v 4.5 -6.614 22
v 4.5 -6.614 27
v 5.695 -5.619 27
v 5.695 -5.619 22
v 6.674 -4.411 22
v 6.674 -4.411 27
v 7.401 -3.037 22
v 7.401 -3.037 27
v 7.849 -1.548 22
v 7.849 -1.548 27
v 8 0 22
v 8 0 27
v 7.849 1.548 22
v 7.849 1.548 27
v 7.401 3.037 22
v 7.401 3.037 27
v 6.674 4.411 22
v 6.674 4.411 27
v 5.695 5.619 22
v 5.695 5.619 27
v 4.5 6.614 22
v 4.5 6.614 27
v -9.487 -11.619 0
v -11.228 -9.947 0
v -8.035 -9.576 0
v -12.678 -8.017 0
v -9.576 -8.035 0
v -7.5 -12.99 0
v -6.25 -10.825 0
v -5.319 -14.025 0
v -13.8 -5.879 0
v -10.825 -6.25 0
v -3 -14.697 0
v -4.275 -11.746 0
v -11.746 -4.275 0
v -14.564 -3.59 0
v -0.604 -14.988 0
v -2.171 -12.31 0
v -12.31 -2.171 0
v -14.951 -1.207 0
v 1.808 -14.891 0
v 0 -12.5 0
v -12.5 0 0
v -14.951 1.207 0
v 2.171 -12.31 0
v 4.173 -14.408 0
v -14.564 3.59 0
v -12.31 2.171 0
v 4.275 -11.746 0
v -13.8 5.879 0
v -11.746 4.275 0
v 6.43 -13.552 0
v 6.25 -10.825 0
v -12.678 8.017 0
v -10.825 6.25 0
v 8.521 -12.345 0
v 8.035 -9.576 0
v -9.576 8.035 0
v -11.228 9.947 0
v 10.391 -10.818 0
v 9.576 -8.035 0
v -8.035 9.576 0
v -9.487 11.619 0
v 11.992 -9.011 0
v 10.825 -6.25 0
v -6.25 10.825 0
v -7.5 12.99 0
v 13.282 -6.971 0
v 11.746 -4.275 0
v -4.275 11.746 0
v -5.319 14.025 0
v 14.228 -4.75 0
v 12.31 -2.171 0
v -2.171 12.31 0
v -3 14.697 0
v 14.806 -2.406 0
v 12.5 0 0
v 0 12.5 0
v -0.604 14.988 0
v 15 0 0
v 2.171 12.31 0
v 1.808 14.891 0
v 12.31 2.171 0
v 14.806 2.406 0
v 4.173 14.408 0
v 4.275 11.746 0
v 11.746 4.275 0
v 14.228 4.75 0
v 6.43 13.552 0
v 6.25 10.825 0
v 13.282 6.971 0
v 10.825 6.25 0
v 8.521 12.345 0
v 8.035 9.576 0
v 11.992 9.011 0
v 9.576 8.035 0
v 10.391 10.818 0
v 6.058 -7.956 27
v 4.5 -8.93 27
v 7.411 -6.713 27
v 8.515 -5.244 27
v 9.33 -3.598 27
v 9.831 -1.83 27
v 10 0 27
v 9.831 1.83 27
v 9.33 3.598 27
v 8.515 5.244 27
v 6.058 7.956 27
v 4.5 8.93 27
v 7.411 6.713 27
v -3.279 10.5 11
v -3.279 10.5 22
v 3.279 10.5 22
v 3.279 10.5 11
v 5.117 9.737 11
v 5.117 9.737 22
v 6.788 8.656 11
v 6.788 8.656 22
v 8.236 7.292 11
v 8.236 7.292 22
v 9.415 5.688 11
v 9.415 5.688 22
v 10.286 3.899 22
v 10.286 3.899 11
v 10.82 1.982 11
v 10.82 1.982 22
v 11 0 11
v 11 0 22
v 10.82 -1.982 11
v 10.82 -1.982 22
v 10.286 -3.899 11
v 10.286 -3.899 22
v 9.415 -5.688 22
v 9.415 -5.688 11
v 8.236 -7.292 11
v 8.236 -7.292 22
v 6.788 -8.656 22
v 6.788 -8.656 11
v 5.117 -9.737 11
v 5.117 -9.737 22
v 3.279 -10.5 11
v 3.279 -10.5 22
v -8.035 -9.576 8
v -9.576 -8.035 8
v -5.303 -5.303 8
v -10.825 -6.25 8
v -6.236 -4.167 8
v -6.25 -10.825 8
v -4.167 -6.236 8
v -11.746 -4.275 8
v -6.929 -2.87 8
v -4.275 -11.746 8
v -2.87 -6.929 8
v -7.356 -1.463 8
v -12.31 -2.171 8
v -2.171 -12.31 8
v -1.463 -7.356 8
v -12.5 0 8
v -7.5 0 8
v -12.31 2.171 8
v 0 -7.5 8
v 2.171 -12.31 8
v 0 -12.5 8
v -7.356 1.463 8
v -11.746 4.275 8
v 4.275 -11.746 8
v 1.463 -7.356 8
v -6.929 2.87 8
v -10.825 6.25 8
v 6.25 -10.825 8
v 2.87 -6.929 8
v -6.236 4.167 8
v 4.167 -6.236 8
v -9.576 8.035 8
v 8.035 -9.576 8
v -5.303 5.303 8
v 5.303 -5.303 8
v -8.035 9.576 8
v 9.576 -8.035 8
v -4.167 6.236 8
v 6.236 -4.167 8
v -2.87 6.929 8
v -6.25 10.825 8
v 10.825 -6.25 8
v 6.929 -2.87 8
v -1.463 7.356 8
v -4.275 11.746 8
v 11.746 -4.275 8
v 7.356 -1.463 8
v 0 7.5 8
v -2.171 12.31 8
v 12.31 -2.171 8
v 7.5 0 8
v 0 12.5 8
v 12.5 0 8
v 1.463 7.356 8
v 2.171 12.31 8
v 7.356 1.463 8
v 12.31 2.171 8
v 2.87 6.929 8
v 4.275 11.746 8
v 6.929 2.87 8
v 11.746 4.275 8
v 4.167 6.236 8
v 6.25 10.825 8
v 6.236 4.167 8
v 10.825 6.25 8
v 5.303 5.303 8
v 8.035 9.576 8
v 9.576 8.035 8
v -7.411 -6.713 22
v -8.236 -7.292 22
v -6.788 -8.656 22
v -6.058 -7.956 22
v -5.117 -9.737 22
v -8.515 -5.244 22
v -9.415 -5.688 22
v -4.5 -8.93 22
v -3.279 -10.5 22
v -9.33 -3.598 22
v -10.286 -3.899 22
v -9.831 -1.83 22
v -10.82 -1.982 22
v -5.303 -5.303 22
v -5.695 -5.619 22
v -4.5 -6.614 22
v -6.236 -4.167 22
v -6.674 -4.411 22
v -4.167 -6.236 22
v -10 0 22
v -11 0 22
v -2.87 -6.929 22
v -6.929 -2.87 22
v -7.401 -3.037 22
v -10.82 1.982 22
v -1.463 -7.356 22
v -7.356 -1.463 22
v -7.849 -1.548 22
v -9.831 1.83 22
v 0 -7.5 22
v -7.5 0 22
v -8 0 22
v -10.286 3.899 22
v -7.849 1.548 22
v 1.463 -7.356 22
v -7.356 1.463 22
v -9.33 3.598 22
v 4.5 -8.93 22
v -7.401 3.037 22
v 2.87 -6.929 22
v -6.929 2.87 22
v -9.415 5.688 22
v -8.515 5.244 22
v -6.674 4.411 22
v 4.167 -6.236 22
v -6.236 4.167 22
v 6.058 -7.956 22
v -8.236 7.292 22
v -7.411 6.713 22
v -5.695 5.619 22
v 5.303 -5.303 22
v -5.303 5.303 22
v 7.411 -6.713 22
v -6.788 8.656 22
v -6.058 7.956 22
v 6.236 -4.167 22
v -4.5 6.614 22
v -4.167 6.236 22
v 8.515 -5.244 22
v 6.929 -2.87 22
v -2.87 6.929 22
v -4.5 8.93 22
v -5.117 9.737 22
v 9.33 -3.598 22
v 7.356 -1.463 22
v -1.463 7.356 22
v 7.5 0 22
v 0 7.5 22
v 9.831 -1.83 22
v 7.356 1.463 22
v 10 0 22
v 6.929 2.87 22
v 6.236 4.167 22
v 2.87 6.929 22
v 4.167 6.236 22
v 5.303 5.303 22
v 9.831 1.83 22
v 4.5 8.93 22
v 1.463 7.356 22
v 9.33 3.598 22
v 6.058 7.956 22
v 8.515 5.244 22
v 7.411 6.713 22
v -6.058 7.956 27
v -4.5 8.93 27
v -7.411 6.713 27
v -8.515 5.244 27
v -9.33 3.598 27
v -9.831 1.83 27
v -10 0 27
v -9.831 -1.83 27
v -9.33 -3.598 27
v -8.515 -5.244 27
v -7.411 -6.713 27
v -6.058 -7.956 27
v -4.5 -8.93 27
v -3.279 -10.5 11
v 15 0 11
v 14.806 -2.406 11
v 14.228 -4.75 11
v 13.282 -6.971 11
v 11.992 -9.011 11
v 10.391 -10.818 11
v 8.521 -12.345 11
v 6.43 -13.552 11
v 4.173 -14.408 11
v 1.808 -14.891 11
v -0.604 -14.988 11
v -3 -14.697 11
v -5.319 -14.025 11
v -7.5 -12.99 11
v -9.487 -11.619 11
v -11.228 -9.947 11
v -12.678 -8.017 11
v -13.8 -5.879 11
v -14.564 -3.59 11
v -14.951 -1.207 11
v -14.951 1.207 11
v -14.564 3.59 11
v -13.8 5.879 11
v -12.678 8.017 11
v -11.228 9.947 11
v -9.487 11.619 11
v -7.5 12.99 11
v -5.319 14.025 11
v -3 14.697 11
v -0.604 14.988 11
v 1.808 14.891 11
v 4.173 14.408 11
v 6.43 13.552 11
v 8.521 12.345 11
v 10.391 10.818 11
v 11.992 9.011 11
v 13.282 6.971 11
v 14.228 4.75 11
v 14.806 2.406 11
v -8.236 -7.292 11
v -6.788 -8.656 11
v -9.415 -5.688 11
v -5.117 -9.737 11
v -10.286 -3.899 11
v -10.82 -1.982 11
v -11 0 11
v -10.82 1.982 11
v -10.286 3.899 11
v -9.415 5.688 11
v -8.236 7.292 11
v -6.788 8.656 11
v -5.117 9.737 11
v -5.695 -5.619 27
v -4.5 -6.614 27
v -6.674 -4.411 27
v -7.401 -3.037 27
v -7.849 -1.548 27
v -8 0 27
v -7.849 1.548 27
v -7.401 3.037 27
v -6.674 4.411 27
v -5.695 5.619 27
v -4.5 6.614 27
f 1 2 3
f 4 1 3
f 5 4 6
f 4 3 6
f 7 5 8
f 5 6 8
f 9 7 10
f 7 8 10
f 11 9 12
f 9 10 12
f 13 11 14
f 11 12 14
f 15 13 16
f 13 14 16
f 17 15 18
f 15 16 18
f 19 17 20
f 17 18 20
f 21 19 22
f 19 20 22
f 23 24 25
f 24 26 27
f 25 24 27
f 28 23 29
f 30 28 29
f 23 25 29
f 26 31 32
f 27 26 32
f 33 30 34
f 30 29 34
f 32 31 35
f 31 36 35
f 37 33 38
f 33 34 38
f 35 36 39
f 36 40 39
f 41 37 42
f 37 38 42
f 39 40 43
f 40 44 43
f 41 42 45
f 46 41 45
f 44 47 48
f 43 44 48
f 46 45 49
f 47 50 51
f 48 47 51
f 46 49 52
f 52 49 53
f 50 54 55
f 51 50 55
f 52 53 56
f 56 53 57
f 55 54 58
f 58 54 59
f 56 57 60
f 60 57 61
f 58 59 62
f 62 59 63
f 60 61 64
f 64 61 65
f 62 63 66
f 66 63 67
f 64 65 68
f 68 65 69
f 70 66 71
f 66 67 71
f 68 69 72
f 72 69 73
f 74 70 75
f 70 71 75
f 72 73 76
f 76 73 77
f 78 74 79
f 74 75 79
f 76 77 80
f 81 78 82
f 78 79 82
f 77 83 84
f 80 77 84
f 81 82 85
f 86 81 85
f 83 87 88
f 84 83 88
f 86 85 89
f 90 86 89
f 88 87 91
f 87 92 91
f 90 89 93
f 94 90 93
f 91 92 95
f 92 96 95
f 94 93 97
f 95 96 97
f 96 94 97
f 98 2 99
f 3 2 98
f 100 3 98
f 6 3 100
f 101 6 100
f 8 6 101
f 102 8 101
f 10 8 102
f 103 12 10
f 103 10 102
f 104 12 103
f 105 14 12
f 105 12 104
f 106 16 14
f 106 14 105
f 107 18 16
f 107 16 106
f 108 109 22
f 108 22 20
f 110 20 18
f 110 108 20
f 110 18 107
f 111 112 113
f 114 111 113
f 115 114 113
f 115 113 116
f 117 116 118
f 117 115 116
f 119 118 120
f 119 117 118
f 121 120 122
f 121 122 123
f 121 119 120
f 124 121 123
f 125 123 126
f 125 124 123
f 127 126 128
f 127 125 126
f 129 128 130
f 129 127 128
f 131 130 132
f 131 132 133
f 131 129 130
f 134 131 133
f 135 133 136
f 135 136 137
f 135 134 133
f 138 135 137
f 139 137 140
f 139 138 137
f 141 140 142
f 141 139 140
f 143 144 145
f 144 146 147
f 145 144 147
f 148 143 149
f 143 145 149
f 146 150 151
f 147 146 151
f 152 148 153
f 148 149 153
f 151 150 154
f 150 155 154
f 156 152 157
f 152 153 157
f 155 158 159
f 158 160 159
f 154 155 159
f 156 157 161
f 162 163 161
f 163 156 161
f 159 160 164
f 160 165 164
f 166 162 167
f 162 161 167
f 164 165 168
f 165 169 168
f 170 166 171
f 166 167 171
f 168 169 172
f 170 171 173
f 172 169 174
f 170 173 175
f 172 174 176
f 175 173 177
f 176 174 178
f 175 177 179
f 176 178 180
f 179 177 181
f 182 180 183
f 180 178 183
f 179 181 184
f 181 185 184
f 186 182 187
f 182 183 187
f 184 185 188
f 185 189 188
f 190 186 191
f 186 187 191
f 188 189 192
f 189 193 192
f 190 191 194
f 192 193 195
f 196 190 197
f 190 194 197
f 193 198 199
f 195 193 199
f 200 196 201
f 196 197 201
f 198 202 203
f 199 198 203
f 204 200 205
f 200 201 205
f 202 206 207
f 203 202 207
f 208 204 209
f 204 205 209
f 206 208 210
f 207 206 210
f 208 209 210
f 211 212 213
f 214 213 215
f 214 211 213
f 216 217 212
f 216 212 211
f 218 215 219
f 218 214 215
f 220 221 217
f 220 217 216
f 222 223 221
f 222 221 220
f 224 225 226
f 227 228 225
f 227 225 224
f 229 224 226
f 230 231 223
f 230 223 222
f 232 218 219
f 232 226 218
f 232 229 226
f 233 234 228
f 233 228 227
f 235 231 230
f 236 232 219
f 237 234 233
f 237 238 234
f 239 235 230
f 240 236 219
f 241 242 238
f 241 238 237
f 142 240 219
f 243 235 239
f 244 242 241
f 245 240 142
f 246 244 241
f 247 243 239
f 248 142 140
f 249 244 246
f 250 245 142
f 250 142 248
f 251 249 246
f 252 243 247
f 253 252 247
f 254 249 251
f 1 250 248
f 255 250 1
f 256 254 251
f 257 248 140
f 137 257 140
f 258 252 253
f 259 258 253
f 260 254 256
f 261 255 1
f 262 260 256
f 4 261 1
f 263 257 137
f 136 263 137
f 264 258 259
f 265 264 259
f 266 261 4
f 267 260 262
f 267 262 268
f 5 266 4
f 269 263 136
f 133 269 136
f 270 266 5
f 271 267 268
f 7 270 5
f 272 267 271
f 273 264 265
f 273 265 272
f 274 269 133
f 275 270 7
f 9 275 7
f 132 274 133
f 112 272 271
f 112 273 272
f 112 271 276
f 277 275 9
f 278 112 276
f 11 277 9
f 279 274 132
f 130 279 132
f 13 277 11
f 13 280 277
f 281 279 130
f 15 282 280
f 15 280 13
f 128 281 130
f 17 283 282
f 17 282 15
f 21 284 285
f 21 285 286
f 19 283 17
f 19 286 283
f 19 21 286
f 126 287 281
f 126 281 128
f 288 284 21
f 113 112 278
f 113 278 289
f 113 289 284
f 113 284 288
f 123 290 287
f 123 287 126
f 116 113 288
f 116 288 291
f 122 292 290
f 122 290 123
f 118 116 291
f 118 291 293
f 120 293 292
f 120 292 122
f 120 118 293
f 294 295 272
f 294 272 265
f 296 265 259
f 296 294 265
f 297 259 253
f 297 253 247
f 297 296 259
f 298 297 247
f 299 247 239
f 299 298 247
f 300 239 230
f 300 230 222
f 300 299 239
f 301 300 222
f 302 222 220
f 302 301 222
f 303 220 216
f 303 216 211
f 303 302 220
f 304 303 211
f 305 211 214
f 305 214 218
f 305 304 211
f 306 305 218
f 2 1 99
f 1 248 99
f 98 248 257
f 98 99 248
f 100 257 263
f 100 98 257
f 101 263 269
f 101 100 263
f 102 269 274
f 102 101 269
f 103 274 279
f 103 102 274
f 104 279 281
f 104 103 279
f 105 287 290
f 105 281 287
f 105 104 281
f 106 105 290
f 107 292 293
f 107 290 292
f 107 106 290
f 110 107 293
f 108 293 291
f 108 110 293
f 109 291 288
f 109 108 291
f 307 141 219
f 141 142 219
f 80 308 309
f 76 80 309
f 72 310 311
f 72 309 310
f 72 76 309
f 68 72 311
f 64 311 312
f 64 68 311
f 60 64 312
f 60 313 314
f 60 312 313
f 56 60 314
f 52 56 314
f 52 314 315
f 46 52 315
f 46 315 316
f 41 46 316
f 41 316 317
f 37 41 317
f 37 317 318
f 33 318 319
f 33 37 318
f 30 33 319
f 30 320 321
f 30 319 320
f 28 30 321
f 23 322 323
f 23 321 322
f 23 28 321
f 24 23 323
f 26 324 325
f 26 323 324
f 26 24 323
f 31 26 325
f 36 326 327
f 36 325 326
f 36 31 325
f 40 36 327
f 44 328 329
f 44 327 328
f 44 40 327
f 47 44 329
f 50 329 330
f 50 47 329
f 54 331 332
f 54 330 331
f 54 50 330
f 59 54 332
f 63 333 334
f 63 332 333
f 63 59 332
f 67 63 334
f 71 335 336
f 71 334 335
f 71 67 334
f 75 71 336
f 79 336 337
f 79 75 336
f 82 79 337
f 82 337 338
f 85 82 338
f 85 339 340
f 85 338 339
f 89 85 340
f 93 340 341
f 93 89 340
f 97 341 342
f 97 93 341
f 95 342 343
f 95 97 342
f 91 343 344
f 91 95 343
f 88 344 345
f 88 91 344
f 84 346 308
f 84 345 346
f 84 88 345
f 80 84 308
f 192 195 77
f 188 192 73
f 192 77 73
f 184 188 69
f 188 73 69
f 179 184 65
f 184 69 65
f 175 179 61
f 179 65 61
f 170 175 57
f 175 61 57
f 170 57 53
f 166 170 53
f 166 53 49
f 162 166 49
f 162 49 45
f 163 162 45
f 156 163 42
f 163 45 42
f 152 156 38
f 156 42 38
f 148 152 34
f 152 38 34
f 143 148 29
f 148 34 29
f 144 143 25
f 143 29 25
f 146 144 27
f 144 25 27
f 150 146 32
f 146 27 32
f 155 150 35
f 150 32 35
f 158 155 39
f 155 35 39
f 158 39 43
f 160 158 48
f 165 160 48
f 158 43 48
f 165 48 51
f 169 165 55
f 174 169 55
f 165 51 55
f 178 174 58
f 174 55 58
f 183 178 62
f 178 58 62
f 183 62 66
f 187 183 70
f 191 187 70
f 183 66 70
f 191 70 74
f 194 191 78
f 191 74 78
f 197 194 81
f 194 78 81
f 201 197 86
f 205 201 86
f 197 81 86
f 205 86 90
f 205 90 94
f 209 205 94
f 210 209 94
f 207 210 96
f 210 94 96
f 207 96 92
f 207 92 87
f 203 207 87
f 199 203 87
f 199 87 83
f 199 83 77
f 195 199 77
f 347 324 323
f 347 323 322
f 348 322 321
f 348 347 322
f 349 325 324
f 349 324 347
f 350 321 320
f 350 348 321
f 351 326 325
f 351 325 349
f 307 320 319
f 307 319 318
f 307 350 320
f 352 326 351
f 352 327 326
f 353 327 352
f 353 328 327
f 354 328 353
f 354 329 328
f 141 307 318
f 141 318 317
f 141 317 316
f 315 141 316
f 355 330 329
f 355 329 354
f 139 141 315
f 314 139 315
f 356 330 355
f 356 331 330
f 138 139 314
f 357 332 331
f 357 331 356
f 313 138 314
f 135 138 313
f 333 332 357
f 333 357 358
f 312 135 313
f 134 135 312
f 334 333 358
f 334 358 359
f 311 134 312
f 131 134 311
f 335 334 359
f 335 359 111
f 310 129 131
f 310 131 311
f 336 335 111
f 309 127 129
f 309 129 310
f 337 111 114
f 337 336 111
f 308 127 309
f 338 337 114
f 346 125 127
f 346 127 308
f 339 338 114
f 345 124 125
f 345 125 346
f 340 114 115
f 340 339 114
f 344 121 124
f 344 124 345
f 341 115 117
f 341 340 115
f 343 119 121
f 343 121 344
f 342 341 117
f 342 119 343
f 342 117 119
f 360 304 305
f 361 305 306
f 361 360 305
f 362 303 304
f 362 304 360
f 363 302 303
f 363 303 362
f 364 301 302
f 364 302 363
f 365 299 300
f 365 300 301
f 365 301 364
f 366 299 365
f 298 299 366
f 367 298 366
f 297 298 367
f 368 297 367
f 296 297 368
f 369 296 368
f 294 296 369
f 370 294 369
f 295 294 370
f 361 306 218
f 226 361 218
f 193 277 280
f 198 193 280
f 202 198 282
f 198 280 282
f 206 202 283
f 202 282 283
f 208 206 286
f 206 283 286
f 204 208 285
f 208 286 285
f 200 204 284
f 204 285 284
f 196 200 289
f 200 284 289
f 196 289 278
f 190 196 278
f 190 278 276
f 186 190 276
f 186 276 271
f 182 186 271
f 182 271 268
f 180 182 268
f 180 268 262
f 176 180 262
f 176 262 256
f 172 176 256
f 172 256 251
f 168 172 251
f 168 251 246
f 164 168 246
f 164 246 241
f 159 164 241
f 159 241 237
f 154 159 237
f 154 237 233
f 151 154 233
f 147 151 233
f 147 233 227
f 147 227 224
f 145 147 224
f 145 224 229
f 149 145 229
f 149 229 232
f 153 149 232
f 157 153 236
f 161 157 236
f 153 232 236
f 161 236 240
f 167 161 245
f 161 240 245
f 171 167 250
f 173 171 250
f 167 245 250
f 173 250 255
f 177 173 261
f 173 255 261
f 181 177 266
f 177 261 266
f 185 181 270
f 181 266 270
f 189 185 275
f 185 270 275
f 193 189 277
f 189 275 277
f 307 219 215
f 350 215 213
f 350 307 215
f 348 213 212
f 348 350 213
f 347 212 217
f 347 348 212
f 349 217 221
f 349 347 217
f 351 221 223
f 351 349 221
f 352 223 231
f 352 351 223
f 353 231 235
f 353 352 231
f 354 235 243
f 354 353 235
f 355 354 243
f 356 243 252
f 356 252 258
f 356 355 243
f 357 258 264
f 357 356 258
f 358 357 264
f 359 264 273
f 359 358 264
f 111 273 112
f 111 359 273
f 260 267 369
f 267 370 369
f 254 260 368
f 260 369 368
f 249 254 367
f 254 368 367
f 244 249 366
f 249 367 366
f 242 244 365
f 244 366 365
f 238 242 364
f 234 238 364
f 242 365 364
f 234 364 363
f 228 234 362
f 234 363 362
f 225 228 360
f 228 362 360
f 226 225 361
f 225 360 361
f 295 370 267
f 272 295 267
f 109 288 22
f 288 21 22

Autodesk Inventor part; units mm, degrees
ref_plane "YZ Plane" through (0, 0, 0) normal (1, 0, 0) x (0, 1, 0)
ref_plane "XZ Plane" through (0, 0, 0) normal (0, 1, 0) x (-1, 0, 0)
ref_plane "XY Plane" through (0, 0, 0) normal (0, 0, 1) x (1, 0, 0)
sketch "Esboço1" plane through (0, 0, 0) normal (0, 0, 1) x (1, 0, 0)
  circle A0 centre (0, 0) radius 12.5
  circle A1 centre (0, 0) radius 15
  dimension "d0" = 25
  dimension "d1" = 30
extrude "Extrusão1" add sketch "Esboço1" along normal blind 11
sketch "Esboço2" plane through (0, 0, 11) normal (0, 0, 1) x (1, 0, 0)
  circle A0 centre (0, 0) radius 15
  dimension "d4" = 30
extrude "Extrusão2" add sketch "Esboço2" against normal blind 3
sketch "Esboço4" plane through (0, 0, 11) normal (0, 0, 1) x (1, 0, 0)
  circle A0 centre (0, 0) radius 11
  dimension "d10" = 22
extrude "Extrusão4" add sketch "Esboço4" along normal blind 16
sketch "Esboço5" plane through (0, 0, 27) normal (0, 0, 1) x (1, 0, 0)
  circle A0 centre (0, 0) radius 7.5
  dimension "d13" = 15
extrude "Extrusão5" cut sketch "Esboço5" against normal through all
sketch "Esboço6" plane through (0, 0, 27) normal (0, 0, 1) x (1, 0, 0)
  circle A0 centre (0, 0) radius 10
  circle A1 centre (0, 0) radius 8
  circle A2 centre (0, 0) radius 7.5
  circle A3 centre (0, 0) radius 11
  dimension "d16" = 20
  dimension "d27" = 16
  dimension "d28" = 22
extrude "Extrusão6" cut sketch "Esboço6" against normal blind 5
thread "Rosca1" size "M22x1" class "6g" standard "ANSI Metric M Profile" length 15
sketch "Esboço7" plane through (0, 0, 0) normal (0, 1, 0) x (-1, 0, 0)
  line L0 (4.5, 22) -> (-4.5, 22)
  line L1 (-4.5, 22) -> (-4.5, 27)
  line L2 (-4.5, 27) -> (4.5, 27)
  line L3 (4.5, 27) -> (4.5, 22)
  line L4 (4.5, 22) -> (-4.5, 27) construction
  line L5 (-4.5, 22) -> (4.5, 27) construction
  line L6 (10, 27) -> (-10, 27) projected
  point P0 (0, 0)
  point P1 (0, 24.5)
  dimension "d22" = 9
  dimension "d23" = 5
  dimension "d24" = 0
extrude "Extrusão7" cut sketch "Esboço7" along normal through all both and the other way through all
sketch "Esboço8" plane through (0, 0, 22) normal (0, 0, 1) x (1, 0, 0)
  line L0 (-10.5, 10.5) -> (10.5, 10.5)
  line L1 (10.5, 10.5) -> (10.5, -10.5)
  line L2 (10.5, -10.5) -> (-10.5, -10.5)
  line L3 (-10.5, -10.5) -> (-10.5, 10.5)
  line L4 (-10.5, 10.5) -> (10.5, -10.5) construction
  line L5 (10.5, 10.5) -> (-10.5, -10.5) construction
  circle A0 centre (0, 0) radius 11
  point P0 (-3.2787, -10.5)
  point P1 (3.2787, -10.5)
  point P2 (3.2787, 10.5)
  point P3 (-3.2787, 10.5)
  dimension "d29" = 21
  dimension "d30" = 21
  dimension "d31" = 22
extrude "Extrusão8" cut sketch "Esboço8" against normal blind 11 contours A0 L0 | L2 A0
properties part number "CARCAÇA DO BOTÃO"
